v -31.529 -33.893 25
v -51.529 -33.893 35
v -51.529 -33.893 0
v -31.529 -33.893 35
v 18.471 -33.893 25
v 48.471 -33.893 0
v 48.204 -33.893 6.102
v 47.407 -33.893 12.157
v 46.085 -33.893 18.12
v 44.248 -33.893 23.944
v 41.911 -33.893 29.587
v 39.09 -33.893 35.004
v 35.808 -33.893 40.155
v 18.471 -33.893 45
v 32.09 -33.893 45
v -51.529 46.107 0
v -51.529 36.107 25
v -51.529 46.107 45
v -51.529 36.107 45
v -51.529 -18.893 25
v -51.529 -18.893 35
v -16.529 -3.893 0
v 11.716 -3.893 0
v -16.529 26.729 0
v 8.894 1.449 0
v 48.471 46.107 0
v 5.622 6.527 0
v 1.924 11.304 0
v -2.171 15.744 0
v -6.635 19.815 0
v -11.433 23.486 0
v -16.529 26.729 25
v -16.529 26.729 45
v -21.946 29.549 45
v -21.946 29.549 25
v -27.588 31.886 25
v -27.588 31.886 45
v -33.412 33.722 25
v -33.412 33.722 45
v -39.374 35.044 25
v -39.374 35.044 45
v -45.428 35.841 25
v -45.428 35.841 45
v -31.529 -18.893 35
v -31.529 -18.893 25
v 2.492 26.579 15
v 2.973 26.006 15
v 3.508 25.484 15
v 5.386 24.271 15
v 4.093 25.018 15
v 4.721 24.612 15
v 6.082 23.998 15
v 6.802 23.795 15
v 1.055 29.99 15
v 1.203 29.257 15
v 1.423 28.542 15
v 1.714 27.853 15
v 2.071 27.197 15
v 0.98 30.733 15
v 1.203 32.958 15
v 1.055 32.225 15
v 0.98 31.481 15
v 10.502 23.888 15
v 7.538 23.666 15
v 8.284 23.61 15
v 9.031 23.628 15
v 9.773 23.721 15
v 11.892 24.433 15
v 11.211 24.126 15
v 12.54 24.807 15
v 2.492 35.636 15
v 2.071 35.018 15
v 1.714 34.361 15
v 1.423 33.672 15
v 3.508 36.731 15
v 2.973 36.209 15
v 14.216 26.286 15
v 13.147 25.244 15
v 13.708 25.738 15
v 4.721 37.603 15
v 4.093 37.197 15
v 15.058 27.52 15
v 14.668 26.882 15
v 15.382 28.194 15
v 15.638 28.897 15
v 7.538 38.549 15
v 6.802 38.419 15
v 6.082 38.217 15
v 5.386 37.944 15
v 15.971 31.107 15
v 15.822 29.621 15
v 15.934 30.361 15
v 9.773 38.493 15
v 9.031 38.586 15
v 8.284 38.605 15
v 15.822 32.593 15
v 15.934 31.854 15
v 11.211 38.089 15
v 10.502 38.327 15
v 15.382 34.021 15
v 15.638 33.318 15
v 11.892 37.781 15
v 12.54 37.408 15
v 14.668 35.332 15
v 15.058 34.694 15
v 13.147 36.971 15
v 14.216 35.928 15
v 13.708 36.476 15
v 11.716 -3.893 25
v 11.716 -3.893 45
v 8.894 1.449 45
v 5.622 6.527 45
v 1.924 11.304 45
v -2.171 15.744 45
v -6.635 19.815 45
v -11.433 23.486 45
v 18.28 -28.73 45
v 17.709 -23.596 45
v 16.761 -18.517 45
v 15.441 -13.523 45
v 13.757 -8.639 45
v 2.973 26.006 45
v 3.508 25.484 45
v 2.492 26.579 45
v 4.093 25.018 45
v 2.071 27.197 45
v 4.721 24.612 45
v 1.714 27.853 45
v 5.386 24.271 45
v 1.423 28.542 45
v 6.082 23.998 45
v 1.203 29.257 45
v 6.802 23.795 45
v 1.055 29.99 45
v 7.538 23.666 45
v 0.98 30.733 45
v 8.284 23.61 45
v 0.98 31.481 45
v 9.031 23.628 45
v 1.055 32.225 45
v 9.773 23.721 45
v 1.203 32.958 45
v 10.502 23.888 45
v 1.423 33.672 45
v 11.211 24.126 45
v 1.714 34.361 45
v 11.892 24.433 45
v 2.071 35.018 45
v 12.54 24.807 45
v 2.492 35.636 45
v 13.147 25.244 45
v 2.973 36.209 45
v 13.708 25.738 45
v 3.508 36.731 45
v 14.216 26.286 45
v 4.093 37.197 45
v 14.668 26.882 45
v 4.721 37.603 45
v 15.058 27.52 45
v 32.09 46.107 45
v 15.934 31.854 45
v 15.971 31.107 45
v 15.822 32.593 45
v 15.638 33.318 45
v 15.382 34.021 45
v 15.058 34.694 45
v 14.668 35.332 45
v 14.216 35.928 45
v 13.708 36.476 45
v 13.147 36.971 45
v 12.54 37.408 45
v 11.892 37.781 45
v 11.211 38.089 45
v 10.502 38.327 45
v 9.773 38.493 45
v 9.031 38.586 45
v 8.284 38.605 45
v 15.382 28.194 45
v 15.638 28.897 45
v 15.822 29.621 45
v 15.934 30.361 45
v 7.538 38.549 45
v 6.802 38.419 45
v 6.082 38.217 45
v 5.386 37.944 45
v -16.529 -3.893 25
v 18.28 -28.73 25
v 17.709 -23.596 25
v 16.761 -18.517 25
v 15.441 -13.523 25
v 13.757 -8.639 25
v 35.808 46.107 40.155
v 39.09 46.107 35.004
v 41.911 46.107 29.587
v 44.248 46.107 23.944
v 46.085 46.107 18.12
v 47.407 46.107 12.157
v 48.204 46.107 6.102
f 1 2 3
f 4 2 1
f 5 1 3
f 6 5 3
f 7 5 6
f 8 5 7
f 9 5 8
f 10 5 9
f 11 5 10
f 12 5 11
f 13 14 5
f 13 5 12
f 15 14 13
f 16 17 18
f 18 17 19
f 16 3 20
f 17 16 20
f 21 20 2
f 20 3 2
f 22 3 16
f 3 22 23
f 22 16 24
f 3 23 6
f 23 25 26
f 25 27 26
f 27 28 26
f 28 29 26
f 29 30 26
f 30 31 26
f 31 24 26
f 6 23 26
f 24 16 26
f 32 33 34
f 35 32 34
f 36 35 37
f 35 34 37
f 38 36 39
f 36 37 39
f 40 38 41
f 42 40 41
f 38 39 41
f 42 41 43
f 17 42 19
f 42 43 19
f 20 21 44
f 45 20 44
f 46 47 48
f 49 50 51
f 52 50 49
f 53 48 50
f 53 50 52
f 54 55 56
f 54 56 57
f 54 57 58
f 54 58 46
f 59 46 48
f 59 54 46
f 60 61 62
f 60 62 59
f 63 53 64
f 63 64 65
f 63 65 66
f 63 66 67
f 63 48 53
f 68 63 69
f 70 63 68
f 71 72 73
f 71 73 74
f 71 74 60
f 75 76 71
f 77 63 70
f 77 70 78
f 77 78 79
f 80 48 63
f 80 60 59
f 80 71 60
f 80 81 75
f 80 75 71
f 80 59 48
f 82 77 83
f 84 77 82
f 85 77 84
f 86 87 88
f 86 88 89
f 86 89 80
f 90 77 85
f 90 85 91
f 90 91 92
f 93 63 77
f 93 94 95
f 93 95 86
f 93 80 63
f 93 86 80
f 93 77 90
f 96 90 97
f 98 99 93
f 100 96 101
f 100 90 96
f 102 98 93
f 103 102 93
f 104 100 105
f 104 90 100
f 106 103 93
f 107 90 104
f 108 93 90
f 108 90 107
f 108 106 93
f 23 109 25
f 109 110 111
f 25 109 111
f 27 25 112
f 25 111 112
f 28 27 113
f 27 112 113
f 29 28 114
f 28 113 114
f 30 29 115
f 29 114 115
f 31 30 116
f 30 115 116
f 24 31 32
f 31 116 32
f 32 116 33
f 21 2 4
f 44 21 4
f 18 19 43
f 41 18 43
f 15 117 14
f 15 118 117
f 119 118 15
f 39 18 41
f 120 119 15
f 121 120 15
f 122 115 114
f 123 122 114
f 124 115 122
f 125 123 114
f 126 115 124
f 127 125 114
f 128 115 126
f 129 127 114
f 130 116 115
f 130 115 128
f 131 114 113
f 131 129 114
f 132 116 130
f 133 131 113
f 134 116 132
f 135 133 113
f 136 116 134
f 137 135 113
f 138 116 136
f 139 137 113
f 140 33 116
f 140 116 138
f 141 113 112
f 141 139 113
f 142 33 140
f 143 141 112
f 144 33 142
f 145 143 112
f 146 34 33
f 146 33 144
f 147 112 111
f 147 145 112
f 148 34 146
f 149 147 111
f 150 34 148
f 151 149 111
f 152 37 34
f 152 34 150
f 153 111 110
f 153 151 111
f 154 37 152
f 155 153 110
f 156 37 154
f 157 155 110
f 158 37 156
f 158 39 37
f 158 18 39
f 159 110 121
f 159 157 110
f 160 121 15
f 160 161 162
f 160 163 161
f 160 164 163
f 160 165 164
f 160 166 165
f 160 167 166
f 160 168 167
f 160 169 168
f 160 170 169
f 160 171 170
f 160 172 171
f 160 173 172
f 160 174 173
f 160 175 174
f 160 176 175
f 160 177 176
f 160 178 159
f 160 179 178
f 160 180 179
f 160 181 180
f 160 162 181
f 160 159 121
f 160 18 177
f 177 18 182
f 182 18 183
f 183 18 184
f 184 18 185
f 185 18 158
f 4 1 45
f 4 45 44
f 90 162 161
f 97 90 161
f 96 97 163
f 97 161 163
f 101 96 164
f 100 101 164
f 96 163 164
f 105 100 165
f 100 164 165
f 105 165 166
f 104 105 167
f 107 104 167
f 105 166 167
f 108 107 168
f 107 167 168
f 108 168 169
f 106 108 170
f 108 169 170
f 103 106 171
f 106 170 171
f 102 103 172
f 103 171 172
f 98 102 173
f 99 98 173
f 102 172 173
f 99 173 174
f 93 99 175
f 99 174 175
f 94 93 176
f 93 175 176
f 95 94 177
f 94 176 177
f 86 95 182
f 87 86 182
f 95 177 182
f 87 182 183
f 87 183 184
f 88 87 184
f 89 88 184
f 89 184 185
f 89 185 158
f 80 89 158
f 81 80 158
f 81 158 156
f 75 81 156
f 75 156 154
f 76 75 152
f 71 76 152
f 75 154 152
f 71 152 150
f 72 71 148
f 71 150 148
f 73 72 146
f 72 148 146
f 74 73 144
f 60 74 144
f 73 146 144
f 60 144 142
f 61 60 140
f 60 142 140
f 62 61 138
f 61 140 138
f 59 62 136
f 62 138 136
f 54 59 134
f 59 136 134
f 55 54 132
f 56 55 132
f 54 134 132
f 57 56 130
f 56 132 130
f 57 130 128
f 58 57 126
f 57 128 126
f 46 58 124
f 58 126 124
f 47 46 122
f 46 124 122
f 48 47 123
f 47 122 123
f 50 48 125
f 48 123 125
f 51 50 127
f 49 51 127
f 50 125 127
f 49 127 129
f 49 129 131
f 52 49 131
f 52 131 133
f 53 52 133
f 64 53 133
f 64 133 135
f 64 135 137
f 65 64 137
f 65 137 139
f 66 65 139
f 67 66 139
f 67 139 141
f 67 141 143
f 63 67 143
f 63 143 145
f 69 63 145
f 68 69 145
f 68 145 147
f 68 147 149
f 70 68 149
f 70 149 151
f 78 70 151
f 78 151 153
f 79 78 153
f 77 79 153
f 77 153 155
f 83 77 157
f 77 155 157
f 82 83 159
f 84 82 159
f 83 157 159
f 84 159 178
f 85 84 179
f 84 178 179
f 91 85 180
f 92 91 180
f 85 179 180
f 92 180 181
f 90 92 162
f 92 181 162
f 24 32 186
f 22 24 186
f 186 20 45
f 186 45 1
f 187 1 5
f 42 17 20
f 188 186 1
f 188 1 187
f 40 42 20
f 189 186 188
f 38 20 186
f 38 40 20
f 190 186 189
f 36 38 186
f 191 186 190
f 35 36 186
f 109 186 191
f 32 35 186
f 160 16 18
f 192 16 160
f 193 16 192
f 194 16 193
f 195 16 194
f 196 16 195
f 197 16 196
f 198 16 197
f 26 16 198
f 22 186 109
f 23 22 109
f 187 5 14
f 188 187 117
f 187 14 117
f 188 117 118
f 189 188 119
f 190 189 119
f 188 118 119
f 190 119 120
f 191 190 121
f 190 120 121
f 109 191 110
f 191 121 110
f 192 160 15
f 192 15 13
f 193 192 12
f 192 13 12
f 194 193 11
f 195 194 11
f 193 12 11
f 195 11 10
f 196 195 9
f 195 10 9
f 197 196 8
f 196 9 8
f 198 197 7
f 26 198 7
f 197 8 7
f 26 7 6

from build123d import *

# Parameters (mm, degrees)
F0_W      = 100
F0_H      = 80
F1_DEPTH  = 45
F5_DEPTH  = 45
F6_R      = 7.5
F8_DEPTH  = 30
F9_DEPTH  = 20
F3_W      = 20
F3_H      = 10
F10_DEPTH = 15
F12_DEPTH = 80


with BuildPart() as f1:
    # F0 (on Top) → F1 (new body)
    with BuildSketch(Plane.XY):
        with Locations((-1.529125, 6.107334)):
            Rectangle(F0_W, F0_H)
    extrude(amount=F1_DEPTH)

    # F4 (on face) → F5 (cut)
    with BuildSketch(Plane.XY.offset(45)):
        with BuildLine():
            ThreePointArc((11.716428, -3.892666), (-0.075549, 13.568155), (-16.529125, 26.729113))
            Line((-16.529125, 26.729113), (-16.529125, -3.892666))
            Line((-16.529125, -3.892666), (11.716428, -3.892666))
        make_face()
    extrude(amount=-F5_DEPTH, mode=Mode.SUBTRACT)

    # F6 (on face) → F8 (cut, through all)
    with BuildSketch(Plane.XY.offset(45)):
        with Locations((8.470875, 31.107334)):
            Circle(F6_R)
    extrude(amount=-F8_DEPTH, mode=Mode.SUBTRACT)

    # F4 (on face) → F9 (cut)
    with BuildSketch(Plane.XY.offset(45)):
        with BuildLine():
            Line((-16.529125, -3.892666), (-16.529125, 26.729113))
            ThreePointArc((-16.529125, 26.729113), (-33.411792, 33.722142), (-51.529125, 36.107334))
            Line((-51.529125, 36.107334), (-51.529125, -33.892666))
            Line((-51.529125, -33.892666), (18.470875, -33.892666))
            ThreePointArc((18.470875, -33.892666), (16.761389, -18.517177), (11.716428, -3.892666))
            Line((11.716428, -3.892666), (-16.529125, -3.892666))
        make_face()
    extrude(amount=-F9_DEPTH, mode=Mode.SUBTRACT)

    # F3 (on face) → F10 (join)
    with BuildSketch(Plane.XZ.offset(33.892666)):
        with Locations((-41.529125, 30)):
            Rectangle(F3_W, F3_H)
    extrude(amount=-F10_DEPTH)

    # F11 (on face) → F12 (cut, through all)
    with BuildSketch(Plane.XZ.offset(33.892666)):
        with BuildLine():
            ThreePointArc((32.089901, 45), (44.248271, 23.944395), (48.470875, 0))
            Line((48.470875, 0), (48.470875, 45))
            Line((48.470875, 45), (32.089901, 45))
        make_face()
    extrude(amount=-F12_DEPTH, mode=Mode.SUBTRACT)


solid = f1.part
